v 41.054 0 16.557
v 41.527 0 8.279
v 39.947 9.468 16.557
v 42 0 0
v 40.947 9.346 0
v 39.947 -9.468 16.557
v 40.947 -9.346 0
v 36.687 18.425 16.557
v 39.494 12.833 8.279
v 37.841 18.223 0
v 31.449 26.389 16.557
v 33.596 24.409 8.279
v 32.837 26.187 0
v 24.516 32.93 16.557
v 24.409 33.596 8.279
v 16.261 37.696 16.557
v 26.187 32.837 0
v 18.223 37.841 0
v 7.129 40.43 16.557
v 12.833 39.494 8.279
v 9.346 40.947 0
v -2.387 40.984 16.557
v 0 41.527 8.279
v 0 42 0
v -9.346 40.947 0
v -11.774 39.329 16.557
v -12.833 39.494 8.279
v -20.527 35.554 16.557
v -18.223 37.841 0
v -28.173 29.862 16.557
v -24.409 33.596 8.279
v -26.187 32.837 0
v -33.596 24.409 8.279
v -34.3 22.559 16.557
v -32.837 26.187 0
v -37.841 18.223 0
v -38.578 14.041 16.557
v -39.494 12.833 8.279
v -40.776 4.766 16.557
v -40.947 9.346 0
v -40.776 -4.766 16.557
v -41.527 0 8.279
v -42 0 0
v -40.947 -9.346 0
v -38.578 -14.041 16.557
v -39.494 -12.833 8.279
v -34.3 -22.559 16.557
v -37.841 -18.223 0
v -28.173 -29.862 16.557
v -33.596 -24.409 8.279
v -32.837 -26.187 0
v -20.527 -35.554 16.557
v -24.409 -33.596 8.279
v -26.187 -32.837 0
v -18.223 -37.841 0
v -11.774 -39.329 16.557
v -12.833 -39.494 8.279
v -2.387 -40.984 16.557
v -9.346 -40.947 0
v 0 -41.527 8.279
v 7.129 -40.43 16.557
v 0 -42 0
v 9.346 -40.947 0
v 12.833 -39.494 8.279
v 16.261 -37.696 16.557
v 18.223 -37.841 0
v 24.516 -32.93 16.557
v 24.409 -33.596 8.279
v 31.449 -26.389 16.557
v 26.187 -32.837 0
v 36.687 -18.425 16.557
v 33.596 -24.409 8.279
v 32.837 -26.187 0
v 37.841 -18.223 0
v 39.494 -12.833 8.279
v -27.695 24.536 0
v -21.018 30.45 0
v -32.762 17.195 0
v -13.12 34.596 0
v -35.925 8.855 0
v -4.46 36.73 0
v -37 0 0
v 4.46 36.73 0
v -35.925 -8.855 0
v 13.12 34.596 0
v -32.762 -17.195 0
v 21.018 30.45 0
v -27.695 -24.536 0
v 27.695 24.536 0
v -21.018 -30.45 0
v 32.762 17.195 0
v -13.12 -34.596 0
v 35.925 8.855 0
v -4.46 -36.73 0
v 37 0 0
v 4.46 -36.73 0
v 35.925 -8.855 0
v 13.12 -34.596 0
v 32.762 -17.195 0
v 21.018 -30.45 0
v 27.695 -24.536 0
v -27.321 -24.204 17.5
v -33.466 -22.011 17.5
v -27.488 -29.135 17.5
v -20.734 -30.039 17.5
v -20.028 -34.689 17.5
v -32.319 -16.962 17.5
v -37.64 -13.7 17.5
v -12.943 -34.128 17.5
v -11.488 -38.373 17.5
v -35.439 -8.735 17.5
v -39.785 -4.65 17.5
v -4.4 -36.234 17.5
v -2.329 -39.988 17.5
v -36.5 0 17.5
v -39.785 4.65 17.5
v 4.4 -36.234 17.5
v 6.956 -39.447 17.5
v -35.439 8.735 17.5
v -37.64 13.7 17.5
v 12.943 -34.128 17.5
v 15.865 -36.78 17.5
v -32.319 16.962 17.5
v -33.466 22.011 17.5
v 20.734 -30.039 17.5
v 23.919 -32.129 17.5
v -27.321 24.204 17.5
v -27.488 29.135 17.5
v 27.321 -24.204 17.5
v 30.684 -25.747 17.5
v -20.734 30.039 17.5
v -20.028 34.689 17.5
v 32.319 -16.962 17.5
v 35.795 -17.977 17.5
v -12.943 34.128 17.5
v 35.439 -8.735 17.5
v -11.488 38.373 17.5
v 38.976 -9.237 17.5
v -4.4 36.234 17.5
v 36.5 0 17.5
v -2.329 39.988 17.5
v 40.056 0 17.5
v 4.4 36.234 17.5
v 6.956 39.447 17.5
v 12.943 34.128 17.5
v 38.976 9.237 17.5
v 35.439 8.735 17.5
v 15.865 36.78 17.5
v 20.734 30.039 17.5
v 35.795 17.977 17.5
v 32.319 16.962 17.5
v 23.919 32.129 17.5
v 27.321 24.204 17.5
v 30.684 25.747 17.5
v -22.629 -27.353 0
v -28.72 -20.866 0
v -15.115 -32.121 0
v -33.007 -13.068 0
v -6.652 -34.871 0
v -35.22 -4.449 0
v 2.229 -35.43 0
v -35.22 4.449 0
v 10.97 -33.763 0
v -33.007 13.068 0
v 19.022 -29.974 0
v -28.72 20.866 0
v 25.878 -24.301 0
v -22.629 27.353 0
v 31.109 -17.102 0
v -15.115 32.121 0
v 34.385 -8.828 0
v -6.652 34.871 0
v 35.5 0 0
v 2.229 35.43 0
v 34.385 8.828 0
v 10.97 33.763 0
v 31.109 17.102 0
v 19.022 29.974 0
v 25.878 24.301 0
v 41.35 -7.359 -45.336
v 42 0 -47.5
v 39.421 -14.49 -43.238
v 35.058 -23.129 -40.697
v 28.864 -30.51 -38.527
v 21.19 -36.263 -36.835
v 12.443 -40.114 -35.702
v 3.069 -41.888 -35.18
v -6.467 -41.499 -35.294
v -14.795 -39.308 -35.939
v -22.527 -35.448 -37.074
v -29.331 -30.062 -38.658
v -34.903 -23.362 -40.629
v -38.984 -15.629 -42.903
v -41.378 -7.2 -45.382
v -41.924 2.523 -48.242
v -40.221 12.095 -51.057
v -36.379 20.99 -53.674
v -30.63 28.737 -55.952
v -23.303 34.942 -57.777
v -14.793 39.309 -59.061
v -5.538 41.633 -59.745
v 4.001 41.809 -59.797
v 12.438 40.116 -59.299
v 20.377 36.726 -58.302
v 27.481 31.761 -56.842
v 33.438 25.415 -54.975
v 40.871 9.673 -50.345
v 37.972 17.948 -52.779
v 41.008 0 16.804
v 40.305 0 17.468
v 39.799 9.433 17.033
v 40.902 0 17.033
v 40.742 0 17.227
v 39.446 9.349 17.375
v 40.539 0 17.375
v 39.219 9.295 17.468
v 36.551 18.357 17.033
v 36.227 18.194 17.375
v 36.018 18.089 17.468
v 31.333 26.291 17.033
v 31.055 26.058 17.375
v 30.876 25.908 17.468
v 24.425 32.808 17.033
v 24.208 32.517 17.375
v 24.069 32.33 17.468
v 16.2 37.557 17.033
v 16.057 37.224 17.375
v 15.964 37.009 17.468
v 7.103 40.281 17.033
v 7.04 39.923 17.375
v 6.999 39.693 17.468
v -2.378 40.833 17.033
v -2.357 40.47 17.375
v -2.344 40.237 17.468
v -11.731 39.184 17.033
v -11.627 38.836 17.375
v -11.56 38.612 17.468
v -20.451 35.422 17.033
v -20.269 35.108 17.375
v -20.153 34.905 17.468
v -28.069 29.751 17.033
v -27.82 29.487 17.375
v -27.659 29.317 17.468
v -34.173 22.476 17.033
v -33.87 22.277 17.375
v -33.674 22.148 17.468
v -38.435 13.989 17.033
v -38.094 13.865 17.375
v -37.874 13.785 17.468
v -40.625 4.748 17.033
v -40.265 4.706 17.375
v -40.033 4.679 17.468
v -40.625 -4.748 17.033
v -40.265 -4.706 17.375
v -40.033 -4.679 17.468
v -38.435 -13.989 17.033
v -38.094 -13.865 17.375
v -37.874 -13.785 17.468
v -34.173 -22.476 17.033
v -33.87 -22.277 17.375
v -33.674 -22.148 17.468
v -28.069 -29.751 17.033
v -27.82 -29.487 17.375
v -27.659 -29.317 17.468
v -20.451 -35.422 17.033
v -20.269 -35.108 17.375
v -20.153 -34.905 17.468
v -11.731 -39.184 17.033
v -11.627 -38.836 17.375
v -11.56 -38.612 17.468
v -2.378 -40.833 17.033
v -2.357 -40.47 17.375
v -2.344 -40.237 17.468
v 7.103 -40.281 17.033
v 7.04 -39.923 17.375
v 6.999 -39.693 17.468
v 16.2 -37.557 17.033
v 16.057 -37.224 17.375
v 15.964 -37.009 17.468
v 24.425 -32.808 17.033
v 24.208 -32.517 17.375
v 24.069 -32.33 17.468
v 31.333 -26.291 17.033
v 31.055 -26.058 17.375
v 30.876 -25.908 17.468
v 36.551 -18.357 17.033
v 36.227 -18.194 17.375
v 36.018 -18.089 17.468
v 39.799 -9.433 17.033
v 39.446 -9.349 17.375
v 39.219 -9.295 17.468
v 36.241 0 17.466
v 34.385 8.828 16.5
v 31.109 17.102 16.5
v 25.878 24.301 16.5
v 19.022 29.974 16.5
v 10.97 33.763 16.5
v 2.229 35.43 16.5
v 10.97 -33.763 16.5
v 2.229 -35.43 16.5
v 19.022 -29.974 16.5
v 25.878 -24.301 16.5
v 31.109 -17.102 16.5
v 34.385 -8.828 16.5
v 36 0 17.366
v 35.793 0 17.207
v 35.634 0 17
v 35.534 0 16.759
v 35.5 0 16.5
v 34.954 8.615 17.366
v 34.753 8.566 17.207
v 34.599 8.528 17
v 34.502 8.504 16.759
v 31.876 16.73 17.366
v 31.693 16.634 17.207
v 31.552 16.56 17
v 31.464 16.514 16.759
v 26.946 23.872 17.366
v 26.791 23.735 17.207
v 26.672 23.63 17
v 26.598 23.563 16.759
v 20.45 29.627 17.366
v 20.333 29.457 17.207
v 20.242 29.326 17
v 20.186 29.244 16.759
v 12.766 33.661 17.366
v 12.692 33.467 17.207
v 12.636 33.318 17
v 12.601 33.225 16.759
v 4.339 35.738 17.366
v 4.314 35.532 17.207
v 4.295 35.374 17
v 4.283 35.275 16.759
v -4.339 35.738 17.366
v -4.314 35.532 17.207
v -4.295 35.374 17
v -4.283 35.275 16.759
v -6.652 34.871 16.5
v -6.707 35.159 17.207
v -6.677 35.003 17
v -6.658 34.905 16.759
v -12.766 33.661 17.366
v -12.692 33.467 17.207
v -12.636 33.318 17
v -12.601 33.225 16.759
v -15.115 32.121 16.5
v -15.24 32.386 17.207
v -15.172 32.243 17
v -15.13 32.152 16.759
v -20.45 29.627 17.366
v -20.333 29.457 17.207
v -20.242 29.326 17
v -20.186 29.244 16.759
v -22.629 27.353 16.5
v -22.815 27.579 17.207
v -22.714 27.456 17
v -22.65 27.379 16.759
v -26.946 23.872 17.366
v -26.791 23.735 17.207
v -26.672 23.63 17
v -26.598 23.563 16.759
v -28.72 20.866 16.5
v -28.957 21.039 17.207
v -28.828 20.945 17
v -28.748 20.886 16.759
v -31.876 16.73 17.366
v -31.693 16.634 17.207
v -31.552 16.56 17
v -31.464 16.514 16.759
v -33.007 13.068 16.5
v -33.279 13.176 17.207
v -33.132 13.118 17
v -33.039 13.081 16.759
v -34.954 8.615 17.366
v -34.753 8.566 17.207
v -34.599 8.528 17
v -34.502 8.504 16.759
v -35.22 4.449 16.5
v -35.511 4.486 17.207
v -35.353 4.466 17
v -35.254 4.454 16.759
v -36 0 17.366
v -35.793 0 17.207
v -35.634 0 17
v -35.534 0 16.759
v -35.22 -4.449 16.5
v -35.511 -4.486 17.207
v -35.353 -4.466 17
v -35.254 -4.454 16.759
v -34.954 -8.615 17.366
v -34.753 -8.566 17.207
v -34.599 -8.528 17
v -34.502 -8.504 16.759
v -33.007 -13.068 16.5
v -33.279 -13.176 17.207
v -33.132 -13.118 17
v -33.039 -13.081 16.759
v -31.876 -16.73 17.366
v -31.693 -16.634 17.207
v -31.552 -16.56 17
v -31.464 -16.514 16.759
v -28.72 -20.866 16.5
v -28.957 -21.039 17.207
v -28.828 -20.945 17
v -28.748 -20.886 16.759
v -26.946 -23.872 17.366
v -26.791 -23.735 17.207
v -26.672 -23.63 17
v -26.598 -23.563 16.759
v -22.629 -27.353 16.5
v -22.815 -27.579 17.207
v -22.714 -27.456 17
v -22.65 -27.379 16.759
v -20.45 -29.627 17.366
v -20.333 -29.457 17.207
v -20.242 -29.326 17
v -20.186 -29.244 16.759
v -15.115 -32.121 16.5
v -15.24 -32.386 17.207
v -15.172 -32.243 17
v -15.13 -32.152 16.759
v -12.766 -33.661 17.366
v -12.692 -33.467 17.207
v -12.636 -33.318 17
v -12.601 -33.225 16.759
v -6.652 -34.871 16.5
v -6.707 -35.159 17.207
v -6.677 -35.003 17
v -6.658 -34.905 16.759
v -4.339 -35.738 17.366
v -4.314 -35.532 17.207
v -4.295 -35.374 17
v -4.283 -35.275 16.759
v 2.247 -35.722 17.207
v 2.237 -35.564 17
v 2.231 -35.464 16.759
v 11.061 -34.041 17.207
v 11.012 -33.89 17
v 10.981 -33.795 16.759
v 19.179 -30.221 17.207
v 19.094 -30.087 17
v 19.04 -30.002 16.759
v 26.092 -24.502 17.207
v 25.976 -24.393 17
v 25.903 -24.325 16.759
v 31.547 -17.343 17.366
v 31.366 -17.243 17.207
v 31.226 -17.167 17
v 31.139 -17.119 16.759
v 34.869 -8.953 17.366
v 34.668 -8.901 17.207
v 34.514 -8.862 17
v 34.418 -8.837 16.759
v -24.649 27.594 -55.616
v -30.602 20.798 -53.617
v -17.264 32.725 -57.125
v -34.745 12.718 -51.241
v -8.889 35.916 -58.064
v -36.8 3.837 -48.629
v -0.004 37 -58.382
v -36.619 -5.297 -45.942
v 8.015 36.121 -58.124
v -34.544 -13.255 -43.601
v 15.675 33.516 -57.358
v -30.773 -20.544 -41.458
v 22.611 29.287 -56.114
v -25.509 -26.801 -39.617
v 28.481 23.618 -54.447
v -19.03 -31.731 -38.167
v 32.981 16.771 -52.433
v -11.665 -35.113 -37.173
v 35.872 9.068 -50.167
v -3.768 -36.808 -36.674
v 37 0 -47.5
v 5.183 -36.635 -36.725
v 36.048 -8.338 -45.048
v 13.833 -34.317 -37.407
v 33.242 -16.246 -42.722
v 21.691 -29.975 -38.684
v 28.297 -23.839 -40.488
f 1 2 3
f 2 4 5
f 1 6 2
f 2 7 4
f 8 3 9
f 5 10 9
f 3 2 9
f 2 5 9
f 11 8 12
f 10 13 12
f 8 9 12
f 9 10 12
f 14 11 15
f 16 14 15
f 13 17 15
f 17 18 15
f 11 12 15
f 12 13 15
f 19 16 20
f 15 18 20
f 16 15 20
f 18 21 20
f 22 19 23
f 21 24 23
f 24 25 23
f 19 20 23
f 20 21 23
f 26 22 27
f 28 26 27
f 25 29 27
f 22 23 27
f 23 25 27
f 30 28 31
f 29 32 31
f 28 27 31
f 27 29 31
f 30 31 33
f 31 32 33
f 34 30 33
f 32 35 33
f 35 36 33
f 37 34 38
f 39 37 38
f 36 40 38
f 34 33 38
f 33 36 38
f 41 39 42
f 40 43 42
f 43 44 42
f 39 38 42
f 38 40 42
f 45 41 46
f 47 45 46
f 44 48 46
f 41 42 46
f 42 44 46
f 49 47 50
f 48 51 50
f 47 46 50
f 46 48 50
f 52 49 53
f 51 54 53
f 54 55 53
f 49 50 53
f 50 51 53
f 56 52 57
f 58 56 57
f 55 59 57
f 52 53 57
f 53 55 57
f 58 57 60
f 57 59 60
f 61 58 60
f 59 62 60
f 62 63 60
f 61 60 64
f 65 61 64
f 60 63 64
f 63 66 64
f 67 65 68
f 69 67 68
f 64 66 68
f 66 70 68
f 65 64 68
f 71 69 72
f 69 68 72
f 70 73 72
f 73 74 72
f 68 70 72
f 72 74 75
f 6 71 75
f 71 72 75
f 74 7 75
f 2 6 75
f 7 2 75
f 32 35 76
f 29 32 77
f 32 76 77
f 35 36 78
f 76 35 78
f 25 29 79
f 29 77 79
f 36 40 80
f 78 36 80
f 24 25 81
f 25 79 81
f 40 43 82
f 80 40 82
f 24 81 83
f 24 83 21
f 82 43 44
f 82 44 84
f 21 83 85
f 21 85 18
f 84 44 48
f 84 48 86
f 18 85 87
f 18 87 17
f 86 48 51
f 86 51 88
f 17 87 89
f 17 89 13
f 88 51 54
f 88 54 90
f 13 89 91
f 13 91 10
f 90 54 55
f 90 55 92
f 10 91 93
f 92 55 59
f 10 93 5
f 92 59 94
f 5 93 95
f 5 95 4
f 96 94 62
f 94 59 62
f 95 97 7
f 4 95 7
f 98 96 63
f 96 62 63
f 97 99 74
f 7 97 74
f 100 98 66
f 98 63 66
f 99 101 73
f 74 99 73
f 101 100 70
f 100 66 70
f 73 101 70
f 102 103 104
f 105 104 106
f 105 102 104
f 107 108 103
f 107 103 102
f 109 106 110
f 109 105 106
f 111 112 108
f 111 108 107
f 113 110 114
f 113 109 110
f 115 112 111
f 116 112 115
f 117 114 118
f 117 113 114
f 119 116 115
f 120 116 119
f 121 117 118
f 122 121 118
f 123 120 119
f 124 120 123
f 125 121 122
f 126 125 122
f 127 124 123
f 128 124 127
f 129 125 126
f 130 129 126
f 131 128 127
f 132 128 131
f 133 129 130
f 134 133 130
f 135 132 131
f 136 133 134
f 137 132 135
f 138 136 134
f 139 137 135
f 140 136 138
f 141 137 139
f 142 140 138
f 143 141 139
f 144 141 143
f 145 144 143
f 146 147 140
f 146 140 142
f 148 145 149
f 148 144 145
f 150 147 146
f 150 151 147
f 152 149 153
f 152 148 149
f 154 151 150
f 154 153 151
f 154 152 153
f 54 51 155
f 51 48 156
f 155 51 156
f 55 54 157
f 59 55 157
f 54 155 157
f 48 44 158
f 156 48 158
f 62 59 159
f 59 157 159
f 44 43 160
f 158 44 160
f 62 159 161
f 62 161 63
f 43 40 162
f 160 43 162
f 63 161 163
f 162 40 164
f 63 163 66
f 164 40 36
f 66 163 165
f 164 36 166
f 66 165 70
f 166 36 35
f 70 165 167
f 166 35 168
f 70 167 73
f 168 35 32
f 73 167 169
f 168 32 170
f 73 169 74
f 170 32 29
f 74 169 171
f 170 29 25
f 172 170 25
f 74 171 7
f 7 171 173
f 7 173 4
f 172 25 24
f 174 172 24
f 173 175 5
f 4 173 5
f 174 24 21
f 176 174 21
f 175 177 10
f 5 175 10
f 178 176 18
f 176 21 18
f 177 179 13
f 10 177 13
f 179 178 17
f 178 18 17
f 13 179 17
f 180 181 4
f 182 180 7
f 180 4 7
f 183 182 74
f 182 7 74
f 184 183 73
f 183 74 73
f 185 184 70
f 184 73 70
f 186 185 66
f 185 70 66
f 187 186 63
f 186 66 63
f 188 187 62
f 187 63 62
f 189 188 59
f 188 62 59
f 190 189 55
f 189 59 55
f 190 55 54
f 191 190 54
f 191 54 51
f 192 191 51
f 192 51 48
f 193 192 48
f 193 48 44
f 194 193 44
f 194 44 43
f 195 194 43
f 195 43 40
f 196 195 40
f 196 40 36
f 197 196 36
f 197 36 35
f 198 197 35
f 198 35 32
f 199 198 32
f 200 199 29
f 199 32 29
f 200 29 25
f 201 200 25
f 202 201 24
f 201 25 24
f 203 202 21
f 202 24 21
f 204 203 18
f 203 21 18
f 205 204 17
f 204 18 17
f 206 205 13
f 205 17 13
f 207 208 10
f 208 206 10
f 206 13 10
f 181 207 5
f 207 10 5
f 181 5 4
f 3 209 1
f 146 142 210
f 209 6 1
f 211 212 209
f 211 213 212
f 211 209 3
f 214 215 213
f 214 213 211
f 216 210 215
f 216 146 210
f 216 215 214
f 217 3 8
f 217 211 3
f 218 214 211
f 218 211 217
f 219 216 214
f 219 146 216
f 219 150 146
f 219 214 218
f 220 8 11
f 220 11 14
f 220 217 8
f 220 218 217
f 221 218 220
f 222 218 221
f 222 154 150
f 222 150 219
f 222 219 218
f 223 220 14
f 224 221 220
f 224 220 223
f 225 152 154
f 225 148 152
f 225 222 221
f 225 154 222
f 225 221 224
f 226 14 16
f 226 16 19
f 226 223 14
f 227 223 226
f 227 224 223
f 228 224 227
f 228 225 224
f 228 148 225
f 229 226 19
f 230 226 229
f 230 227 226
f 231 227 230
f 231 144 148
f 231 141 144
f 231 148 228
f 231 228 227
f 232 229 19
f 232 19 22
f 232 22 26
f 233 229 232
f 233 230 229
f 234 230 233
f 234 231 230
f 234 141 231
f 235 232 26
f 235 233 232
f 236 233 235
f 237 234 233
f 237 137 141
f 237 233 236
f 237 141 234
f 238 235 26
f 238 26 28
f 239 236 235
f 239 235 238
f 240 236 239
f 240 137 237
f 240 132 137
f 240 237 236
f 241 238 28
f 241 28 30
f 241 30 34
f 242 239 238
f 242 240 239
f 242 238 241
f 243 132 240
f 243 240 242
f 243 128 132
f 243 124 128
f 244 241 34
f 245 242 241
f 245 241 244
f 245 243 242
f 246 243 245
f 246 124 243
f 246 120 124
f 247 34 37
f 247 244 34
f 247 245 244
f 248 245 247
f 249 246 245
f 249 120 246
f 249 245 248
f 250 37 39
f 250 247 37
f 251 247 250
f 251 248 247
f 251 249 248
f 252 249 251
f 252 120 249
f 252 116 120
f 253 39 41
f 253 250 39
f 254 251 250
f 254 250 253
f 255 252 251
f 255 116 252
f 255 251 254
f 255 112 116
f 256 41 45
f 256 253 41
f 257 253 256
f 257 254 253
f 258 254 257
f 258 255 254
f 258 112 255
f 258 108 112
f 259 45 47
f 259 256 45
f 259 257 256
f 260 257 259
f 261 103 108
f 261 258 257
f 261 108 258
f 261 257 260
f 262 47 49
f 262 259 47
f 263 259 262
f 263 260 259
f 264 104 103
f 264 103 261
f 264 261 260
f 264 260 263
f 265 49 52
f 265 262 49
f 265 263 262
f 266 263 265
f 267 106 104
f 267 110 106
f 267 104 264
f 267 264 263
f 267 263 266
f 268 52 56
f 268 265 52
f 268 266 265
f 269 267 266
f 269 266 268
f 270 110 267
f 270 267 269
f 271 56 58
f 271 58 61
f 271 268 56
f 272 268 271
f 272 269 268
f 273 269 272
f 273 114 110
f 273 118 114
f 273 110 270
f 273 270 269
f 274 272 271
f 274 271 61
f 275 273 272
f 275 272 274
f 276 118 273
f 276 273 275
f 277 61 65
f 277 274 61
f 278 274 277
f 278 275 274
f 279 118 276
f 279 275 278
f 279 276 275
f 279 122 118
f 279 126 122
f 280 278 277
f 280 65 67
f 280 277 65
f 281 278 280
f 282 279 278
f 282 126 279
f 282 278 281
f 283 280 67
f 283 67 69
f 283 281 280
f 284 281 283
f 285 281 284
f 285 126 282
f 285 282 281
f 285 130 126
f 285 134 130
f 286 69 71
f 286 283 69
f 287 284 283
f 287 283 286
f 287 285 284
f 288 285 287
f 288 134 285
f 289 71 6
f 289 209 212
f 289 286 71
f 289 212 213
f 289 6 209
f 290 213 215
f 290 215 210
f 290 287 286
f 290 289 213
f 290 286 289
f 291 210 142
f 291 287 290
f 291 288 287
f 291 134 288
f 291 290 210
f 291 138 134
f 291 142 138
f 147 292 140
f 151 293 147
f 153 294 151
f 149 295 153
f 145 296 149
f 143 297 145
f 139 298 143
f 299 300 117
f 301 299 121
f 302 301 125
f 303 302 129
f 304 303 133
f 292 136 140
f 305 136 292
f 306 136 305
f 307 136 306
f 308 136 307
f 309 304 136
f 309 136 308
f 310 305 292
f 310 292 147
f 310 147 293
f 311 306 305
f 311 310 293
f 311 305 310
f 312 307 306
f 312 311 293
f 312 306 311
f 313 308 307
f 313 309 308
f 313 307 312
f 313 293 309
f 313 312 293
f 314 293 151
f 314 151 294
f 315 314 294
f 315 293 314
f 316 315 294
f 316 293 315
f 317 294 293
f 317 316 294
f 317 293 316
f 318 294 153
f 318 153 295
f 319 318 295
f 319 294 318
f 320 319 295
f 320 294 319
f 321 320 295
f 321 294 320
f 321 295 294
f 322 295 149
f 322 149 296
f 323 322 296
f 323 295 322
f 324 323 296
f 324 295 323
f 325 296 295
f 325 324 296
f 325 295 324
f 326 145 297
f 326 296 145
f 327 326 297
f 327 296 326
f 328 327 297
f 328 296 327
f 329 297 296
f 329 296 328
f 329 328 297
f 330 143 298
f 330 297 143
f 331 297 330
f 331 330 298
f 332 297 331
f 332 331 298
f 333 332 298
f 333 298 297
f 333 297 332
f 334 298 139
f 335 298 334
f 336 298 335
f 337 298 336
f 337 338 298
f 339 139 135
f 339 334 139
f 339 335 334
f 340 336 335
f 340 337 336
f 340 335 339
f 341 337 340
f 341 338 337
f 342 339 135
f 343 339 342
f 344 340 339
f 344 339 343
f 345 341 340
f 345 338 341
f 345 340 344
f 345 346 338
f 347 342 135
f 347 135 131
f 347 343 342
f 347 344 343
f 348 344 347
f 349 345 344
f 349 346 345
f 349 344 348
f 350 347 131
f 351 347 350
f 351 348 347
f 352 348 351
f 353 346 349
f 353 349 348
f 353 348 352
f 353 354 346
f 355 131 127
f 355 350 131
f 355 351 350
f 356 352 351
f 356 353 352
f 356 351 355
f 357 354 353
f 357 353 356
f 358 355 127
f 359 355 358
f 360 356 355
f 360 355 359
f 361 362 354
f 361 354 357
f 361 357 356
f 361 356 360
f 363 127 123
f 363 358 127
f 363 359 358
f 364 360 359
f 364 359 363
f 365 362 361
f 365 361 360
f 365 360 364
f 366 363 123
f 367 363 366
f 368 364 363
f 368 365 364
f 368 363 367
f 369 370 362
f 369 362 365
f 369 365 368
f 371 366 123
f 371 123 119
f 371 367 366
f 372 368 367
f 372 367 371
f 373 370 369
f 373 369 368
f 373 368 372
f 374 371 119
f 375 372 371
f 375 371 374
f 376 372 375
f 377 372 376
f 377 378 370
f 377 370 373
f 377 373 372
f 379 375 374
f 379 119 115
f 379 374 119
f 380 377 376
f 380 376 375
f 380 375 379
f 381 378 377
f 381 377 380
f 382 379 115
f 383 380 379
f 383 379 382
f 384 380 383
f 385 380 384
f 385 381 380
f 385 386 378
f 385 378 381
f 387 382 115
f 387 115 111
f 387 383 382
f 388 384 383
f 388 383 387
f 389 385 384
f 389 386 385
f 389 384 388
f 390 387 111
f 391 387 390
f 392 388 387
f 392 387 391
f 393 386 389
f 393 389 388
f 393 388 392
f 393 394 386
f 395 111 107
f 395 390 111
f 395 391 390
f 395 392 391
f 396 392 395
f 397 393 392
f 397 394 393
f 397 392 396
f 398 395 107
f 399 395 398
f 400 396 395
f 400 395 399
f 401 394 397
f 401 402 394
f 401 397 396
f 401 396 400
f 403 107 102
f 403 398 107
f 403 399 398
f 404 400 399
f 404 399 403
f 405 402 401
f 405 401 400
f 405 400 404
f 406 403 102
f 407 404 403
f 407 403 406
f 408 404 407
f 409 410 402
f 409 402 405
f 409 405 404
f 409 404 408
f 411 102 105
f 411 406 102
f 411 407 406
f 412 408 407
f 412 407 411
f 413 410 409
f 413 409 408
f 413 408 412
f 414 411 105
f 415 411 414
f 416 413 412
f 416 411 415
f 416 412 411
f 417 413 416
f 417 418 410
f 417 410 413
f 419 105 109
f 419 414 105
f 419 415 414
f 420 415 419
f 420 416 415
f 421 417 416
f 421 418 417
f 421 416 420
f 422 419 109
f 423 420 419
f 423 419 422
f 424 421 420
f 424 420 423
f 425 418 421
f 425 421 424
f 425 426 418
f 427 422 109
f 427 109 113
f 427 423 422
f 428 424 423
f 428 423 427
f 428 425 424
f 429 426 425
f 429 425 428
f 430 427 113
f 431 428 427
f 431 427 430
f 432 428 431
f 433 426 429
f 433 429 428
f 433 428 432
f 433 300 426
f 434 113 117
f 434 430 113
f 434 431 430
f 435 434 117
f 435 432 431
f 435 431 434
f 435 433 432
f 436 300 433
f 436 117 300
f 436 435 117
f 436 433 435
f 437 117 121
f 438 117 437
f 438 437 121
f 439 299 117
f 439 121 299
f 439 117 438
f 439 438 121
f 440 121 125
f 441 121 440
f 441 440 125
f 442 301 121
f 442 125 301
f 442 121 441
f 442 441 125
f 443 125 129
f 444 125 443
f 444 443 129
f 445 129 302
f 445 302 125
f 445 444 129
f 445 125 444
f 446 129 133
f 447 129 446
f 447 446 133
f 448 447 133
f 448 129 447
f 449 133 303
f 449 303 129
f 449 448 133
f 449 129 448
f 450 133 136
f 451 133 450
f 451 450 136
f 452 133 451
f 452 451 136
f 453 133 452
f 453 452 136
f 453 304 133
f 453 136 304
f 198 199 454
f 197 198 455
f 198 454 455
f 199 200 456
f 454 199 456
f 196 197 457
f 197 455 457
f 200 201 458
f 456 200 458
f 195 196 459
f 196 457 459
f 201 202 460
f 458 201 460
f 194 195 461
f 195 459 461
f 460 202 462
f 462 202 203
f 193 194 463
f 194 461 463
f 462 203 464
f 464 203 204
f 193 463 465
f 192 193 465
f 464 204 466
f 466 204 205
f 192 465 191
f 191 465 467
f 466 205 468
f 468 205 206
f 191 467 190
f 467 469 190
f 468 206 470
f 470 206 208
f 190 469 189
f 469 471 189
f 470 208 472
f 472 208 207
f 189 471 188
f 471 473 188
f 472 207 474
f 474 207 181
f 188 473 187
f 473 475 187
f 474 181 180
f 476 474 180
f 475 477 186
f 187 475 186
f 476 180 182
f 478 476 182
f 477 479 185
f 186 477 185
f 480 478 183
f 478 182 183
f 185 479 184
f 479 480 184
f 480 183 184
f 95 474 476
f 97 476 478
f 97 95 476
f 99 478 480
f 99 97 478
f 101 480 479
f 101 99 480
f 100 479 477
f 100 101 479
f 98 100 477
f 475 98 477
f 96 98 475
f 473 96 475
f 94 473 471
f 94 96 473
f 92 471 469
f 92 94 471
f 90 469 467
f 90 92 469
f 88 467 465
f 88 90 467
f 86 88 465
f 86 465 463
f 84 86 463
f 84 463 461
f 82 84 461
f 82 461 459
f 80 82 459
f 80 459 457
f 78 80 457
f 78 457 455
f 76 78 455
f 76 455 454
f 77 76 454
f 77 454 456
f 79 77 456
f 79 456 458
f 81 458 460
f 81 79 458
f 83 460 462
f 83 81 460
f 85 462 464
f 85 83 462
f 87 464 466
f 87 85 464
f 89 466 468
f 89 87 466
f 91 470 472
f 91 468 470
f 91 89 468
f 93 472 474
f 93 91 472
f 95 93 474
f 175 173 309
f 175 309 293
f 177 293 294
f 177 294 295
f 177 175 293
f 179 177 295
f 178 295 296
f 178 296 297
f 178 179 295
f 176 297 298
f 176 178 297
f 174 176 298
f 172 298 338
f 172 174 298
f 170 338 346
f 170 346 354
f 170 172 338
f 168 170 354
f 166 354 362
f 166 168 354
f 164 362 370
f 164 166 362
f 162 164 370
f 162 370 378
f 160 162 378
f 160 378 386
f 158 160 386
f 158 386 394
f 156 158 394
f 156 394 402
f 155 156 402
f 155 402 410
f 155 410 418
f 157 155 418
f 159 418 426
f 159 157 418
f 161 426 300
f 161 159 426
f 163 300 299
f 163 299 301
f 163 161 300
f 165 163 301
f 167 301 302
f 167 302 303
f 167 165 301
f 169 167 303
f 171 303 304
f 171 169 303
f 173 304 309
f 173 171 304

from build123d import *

# Parameters (mm, degrees)
F0_R     = 42
F0_R_2   = 35.5
F1_DEPTH = 17.5
F2_SIZE2 = 17.49999
F2_SIZE  = 0.99999
F3_R     = 1
F4_R     = 42
F4_R_2   = 37
F5_DEPTH = 60
F7_DEPTH = 45


# Not quite as in the source:
# - a fillet or chamfer is up to 0.001 mm smaller than in the source, because OpenCascade refuses the exact size


with BuildPart() as f1:
    # F0 (on Top) → F1 (new body)
    with BuildSketch(Plane.XY):
        Circle(F0_R)
        Circle(F0_R_2, mode=Mode.SUBTRACT)
    extrude(amount=F1_DEPTH)

    # F2 (size 1 and 17.5 in the source; OpenCascade refuses exactly that, so slightly less here)
    f2_edges = [f1.edges().sort_by_distance(p)[0] for p in [
        (-42, 0, 17.5),
    ]]
    f2_side = f1.faces().sort_by_distance((-40.812061, 0, 17.5))[0]
    chamfer(f2_edges, length=F2_SIZE, length2=F2_SIZE2, reference=f2_side)

    # F3
    f3_edges = [f1.edges().sort_by_distance(p)[0] for p in [
        (-41.00001, 0, 17.5),
        (-35.5, 0, 17.5),
    ]]
    fillet(f3_edges, radius=F3_R)


with BuildPart() as f5:
    # F4 (on face) → F5 (new body)
    with BuildSketch(Plane(origin=(0, 0, 0), x_dir=(1, 0, 0), z_dir=(0, 0, -1))):
        Circle(F4_R)
        Circle(F4_R_2, mode=Mode.SUBTRACT)
    extrude(amount=F5_DEPTH)

    # F6 (on Right) → F7 (cut, symmetric)
    with BuildSketch(Plane.YZ):
        Polygon((42.5, -69.3717226386), (42.5, -60), (-42.5, -35), (-49.787659198, -69.3717226386), align=None)
    extrude(amount=F7_DEPTH, both=True, mode=Mode.SUBTRACT)


solid = Compound([f1.part, f5.part])
